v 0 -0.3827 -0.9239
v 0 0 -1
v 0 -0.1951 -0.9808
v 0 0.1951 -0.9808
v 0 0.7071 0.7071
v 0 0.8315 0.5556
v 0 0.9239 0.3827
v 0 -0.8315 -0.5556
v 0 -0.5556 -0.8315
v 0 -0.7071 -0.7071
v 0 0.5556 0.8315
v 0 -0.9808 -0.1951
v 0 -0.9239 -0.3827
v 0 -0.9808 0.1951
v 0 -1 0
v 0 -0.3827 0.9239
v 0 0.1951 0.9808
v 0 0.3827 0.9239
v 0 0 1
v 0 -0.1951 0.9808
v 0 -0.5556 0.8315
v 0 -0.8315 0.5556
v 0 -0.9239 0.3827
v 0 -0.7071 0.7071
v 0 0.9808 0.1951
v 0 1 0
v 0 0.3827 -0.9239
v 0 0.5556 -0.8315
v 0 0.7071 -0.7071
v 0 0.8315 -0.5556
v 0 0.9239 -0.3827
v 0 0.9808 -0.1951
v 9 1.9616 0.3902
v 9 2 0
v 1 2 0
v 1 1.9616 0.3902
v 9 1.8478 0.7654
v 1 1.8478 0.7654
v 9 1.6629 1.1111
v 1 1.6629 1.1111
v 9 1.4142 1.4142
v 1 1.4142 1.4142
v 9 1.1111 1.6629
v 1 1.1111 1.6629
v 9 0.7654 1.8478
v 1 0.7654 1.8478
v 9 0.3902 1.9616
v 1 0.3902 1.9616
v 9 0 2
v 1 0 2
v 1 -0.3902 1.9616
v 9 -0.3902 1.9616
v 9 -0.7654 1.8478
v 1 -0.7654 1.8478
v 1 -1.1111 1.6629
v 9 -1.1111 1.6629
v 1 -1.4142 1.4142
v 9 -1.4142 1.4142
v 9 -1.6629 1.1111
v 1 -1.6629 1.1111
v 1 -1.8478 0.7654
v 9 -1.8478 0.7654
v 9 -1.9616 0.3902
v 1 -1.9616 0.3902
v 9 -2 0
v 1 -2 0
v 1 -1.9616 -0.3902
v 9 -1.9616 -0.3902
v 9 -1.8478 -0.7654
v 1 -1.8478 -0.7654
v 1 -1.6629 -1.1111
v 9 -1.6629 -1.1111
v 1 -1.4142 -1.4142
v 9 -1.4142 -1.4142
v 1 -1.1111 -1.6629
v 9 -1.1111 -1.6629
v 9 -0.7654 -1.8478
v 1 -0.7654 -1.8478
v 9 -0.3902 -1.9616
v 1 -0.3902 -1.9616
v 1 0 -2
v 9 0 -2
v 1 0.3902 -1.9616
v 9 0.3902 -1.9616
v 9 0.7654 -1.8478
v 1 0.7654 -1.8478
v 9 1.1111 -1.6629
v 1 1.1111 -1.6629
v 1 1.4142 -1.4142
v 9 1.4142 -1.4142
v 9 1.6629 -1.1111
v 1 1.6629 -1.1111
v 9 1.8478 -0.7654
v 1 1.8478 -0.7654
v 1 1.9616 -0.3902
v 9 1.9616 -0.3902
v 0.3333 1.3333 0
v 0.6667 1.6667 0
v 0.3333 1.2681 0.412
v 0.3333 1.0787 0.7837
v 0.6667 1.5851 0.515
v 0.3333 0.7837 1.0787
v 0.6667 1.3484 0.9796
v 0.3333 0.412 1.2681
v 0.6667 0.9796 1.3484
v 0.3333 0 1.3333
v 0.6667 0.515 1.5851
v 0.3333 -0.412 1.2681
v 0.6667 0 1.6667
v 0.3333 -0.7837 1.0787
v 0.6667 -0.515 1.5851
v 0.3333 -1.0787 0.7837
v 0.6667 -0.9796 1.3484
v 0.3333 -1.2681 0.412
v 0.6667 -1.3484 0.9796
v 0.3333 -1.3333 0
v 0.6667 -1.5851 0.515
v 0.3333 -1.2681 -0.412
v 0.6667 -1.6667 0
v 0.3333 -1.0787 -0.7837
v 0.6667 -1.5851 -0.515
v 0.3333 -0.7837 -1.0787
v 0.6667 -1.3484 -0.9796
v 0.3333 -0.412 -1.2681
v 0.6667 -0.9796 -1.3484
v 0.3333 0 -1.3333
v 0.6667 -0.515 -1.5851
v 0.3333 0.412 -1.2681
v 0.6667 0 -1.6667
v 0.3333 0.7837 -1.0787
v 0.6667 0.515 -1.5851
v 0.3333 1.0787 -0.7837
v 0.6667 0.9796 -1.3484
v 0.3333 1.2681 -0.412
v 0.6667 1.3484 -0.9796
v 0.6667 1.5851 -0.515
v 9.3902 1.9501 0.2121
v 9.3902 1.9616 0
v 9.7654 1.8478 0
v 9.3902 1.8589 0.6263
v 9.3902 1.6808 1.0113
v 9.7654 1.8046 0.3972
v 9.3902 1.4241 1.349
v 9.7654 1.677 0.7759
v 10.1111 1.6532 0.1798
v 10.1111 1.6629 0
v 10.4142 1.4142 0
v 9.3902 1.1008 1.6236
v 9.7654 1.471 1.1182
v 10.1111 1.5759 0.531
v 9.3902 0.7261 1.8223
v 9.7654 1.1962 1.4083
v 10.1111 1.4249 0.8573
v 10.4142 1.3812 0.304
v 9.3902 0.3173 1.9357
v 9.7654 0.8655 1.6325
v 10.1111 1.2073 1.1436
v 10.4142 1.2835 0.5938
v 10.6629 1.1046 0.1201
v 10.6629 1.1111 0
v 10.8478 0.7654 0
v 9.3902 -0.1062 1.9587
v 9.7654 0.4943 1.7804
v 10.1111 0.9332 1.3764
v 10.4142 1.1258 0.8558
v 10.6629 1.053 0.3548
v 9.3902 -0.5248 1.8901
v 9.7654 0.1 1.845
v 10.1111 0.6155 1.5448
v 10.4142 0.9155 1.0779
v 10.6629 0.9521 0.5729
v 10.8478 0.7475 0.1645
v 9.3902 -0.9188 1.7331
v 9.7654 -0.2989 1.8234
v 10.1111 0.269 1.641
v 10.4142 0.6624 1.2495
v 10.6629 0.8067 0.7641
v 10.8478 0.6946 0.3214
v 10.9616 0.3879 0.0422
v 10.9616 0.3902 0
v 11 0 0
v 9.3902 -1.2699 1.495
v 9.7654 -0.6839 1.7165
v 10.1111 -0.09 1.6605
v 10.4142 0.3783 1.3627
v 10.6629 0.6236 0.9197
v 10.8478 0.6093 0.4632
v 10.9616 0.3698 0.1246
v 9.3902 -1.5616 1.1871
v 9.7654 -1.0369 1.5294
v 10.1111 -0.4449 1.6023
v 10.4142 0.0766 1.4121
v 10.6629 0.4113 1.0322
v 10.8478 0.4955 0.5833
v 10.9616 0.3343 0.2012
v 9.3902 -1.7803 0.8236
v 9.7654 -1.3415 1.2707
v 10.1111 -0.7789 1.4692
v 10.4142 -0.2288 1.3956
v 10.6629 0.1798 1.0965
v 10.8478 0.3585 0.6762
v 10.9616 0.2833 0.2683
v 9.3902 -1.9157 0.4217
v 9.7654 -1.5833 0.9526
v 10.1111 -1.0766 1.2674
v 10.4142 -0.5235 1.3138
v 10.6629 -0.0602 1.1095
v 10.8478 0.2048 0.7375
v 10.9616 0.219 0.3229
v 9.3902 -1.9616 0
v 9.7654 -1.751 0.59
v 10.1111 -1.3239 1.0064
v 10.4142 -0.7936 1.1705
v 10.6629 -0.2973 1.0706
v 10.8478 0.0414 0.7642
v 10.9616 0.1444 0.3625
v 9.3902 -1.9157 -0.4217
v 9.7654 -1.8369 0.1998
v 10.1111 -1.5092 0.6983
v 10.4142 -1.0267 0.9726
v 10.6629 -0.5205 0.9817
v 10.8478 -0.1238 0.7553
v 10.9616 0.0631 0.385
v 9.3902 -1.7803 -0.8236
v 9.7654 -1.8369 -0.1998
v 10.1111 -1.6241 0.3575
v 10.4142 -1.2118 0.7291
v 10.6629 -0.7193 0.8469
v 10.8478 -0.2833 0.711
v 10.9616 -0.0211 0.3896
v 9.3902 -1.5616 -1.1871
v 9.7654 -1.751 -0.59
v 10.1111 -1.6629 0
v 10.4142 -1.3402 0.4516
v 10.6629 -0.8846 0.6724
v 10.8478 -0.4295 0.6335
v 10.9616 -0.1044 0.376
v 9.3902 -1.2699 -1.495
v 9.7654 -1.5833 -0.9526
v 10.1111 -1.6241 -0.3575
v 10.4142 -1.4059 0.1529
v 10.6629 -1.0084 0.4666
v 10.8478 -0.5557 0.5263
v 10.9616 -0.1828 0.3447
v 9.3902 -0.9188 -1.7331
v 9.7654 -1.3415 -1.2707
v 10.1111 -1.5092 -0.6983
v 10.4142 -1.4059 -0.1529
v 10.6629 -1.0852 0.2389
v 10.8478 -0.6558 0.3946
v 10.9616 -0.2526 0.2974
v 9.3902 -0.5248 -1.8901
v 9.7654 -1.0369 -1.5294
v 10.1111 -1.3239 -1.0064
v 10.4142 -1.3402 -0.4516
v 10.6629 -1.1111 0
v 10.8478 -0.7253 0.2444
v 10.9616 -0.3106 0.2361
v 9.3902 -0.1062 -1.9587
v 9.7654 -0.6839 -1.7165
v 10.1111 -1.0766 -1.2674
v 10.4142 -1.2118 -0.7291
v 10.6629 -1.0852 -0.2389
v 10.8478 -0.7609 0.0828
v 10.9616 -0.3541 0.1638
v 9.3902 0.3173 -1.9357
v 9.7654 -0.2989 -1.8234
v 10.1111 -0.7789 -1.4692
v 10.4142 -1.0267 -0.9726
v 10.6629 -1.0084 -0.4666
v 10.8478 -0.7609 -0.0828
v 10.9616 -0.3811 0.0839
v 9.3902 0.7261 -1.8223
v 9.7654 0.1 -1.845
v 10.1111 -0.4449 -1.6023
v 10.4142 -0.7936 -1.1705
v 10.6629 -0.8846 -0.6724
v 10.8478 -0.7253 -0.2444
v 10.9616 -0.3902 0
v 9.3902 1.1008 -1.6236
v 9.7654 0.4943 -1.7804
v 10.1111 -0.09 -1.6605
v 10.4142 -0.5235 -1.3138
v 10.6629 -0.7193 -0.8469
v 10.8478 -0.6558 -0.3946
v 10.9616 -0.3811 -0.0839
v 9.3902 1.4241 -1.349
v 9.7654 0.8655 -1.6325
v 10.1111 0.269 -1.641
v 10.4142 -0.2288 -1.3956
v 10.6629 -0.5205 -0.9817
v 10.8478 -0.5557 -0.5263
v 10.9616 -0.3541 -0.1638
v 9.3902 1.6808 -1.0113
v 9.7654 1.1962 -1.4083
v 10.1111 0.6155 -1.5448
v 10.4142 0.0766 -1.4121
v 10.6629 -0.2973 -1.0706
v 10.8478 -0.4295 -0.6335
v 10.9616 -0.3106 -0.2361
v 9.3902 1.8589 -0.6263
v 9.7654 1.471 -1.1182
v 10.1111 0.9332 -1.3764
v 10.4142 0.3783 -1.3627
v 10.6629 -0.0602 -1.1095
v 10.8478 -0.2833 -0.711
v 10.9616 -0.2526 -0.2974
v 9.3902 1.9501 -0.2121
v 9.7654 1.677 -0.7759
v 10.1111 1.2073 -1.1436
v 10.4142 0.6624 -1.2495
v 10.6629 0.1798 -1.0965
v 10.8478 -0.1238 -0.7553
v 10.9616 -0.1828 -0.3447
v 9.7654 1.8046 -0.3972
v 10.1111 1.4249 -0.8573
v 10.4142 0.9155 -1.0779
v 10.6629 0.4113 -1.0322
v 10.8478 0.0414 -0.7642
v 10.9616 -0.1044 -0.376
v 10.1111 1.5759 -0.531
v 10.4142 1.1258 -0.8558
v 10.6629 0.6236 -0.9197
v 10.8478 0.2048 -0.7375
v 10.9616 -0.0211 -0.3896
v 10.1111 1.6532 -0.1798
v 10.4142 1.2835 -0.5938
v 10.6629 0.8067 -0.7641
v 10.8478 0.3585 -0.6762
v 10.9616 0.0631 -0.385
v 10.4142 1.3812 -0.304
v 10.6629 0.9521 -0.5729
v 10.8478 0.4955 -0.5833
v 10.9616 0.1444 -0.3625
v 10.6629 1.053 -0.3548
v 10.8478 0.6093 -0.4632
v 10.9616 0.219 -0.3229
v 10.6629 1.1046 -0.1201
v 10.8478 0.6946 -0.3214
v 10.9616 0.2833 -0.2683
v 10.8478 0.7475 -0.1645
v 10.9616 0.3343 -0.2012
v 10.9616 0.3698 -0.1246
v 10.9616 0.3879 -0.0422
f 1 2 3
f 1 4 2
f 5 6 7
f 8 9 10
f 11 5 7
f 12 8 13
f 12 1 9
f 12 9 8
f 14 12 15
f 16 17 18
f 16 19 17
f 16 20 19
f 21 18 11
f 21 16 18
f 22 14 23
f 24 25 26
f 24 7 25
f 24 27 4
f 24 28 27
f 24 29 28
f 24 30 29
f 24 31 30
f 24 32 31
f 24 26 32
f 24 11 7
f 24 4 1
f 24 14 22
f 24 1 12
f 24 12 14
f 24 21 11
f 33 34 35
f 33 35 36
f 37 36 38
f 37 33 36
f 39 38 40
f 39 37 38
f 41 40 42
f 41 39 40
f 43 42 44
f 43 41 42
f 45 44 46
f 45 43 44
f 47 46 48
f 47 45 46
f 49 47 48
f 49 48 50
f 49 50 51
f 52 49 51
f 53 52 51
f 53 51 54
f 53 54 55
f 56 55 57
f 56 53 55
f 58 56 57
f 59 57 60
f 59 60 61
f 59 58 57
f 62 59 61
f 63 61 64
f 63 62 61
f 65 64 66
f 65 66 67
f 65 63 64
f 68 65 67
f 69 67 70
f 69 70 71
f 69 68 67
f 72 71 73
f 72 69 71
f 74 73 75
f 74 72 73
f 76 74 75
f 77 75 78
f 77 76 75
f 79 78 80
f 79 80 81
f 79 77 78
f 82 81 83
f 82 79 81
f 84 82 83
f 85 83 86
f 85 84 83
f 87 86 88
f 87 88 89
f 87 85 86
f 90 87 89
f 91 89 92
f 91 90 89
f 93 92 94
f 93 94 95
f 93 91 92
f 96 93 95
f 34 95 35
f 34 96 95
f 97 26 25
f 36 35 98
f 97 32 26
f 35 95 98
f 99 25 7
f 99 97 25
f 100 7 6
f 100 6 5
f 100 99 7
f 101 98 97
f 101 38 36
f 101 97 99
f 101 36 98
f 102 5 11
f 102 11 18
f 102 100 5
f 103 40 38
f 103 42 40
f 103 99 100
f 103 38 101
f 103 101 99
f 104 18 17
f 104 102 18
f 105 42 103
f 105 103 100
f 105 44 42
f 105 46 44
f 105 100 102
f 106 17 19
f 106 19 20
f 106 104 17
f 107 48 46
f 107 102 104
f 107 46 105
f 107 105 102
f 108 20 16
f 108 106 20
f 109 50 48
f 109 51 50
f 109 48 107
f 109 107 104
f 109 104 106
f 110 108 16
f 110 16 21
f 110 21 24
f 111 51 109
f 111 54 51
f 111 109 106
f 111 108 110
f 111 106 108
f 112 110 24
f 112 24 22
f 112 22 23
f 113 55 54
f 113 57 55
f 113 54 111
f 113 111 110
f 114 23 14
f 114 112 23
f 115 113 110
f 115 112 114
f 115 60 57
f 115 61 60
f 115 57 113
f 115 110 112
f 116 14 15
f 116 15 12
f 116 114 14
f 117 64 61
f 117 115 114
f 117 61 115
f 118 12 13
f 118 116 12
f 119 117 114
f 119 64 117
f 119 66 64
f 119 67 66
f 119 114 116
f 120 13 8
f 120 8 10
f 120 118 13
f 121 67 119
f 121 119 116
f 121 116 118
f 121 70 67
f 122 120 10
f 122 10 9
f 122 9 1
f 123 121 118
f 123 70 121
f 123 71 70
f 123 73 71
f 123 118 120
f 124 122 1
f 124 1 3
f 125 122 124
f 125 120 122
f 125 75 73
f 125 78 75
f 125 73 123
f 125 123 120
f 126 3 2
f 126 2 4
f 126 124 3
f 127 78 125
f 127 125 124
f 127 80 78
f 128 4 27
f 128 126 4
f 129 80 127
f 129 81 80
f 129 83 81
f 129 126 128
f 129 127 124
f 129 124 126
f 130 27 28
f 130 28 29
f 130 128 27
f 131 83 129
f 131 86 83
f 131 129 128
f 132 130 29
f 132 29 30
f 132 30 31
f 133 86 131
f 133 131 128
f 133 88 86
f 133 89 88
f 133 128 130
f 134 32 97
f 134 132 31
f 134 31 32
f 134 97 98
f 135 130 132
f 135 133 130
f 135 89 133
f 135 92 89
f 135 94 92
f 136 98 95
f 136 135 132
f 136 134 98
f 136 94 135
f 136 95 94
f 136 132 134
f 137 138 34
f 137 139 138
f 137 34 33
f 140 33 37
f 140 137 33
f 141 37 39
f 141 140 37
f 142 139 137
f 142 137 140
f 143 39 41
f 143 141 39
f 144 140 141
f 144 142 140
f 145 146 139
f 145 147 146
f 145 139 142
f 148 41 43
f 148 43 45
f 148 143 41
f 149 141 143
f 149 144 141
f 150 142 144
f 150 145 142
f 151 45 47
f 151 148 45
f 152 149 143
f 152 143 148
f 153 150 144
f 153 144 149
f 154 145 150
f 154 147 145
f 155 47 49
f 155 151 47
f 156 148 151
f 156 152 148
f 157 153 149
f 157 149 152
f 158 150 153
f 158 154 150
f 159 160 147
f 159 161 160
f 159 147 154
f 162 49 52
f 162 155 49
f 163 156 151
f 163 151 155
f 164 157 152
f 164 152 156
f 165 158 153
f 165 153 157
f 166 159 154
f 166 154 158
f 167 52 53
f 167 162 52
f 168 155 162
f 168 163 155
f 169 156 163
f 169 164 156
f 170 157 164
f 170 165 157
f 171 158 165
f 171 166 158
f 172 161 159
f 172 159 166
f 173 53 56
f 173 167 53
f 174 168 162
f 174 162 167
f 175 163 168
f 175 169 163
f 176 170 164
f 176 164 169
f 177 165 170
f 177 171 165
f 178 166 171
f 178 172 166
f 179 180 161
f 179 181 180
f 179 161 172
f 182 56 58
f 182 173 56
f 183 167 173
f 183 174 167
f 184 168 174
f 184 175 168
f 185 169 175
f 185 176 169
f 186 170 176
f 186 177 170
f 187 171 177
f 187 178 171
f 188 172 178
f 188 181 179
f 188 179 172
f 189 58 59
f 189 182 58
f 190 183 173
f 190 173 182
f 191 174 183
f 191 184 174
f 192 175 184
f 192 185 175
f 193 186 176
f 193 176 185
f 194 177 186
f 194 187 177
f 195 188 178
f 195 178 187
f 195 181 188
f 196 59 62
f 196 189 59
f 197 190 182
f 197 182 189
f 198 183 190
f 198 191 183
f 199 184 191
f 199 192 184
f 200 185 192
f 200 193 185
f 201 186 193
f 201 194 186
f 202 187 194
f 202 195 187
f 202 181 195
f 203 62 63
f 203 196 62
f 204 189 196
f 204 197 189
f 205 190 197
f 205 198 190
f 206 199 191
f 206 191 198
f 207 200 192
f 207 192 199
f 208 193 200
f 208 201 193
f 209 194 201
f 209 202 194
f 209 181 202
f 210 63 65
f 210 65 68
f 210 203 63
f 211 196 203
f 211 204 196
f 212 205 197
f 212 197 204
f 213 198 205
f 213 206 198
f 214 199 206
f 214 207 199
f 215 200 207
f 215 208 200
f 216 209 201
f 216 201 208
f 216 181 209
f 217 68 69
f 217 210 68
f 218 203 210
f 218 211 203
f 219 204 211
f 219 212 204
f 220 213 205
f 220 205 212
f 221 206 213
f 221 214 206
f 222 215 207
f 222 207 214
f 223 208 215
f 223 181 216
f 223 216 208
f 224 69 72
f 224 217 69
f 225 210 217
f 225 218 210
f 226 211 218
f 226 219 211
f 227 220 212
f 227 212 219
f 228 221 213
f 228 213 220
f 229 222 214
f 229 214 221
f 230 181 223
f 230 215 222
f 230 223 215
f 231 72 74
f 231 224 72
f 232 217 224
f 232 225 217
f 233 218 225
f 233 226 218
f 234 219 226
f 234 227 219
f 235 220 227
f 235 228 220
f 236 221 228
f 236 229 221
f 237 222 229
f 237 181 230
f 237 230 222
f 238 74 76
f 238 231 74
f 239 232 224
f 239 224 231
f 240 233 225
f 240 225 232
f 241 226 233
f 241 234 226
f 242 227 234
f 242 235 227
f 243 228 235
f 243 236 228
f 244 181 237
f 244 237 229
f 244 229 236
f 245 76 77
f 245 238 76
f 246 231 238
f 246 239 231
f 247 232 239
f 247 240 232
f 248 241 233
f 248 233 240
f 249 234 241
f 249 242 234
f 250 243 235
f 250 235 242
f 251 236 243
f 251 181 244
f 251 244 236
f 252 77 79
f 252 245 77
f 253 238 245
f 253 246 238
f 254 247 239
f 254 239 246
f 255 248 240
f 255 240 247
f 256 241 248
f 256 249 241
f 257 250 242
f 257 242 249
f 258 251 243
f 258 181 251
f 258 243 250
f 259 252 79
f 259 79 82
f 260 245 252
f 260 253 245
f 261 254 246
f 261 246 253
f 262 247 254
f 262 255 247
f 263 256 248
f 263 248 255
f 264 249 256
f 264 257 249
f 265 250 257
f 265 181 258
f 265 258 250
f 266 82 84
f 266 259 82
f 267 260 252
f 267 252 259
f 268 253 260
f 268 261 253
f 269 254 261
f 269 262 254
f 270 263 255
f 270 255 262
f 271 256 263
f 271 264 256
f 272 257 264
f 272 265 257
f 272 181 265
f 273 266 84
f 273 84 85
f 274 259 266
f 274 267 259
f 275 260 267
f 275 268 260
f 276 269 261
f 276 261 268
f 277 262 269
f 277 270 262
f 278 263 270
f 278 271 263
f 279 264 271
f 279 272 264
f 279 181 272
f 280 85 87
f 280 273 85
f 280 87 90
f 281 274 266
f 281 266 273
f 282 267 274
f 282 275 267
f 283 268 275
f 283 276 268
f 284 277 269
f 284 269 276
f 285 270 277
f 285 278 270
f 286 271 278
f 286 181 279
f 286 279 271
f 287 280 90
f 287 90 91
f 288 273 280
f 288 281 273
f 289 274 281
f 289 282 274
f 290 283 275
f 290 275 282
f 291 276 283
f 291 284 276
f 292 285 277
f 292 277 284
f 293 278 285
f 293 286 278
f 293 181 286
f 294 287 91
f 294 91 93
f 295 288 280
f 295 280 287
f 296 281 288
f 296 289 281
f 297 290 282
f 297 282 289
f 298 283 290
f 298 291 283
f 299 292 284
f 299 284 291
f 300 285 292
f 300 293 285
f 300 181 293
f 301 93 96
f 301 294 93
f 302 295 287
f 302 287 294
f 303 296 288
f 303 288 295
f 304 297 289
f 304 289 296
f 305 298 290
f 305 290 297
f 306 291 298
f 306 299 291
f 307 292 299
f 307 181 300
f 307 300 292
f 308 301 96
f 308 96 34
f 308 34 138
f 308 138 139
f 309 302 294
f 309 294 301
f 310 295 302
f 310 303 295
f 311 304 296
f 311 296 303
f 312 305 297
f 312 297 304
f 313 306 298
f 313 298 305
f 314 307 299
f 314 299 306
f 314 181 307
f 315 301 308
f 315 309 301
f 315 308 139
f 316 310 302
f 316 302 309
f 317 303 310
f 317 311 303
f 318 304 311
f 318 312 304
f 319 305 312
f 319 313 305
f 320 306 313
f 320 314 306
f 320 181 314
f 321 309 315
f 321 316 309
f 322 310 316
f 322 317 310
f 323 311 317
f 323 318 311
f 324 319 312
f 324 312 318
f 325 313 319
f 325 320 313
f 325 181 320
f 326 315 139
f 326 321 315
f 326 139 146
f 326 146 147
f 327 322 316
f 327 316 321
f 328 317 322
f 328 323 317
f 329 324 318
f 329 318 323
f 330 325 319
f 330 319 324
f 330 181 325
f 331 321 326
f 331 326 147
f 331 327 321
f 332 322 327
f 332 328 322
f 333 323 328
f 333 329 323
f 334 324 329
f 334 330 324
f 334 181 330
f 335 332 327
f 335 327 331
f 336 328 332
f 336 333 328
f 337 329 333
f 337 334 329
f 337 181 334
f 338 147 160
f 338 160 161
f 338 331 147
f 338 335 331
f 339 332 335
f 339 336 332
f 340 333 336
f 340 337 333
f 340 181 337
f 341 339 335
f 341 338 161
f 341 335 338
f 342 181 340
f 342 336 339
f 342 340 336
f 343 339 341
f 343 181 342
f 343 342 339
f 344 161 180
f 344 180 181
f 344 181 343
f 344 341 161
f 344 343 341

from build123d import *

# Parameters (mm, degrees)
SKETCH1_W     = 11
SKETCH1_H     = 2
CHAMFER1_SIZE = 1
FILLET1_R     = 2


with BuildPart() as part:
    # Sketch1 → Revolve1 (revolve)
    with BuildSketch(Plane.XY):
        with Locations((5.5, 1)):
            Rectangle(SKETCH1_W, SKETCH1_H)
    revolve(axis=Axis((-4.801500481, 0, 0), (1, 0, 0)))

    # Chamfer1
    chamfer1_edges = [part.edges().sort_by_distance(p)[0] for p in [
        (0, -2, 0),
    ]]
    chamfer(chamfer1_edges, length=CHAMFER1_SIZE)

    # Fillet1
    fillet1_edges = [part.edges().sort_by_distance(p)[0] for p in [
        (11, -2, 0),
    ]]
    fillet(fillet1_edges, radius=FILLET1_R)


solid = part.part
